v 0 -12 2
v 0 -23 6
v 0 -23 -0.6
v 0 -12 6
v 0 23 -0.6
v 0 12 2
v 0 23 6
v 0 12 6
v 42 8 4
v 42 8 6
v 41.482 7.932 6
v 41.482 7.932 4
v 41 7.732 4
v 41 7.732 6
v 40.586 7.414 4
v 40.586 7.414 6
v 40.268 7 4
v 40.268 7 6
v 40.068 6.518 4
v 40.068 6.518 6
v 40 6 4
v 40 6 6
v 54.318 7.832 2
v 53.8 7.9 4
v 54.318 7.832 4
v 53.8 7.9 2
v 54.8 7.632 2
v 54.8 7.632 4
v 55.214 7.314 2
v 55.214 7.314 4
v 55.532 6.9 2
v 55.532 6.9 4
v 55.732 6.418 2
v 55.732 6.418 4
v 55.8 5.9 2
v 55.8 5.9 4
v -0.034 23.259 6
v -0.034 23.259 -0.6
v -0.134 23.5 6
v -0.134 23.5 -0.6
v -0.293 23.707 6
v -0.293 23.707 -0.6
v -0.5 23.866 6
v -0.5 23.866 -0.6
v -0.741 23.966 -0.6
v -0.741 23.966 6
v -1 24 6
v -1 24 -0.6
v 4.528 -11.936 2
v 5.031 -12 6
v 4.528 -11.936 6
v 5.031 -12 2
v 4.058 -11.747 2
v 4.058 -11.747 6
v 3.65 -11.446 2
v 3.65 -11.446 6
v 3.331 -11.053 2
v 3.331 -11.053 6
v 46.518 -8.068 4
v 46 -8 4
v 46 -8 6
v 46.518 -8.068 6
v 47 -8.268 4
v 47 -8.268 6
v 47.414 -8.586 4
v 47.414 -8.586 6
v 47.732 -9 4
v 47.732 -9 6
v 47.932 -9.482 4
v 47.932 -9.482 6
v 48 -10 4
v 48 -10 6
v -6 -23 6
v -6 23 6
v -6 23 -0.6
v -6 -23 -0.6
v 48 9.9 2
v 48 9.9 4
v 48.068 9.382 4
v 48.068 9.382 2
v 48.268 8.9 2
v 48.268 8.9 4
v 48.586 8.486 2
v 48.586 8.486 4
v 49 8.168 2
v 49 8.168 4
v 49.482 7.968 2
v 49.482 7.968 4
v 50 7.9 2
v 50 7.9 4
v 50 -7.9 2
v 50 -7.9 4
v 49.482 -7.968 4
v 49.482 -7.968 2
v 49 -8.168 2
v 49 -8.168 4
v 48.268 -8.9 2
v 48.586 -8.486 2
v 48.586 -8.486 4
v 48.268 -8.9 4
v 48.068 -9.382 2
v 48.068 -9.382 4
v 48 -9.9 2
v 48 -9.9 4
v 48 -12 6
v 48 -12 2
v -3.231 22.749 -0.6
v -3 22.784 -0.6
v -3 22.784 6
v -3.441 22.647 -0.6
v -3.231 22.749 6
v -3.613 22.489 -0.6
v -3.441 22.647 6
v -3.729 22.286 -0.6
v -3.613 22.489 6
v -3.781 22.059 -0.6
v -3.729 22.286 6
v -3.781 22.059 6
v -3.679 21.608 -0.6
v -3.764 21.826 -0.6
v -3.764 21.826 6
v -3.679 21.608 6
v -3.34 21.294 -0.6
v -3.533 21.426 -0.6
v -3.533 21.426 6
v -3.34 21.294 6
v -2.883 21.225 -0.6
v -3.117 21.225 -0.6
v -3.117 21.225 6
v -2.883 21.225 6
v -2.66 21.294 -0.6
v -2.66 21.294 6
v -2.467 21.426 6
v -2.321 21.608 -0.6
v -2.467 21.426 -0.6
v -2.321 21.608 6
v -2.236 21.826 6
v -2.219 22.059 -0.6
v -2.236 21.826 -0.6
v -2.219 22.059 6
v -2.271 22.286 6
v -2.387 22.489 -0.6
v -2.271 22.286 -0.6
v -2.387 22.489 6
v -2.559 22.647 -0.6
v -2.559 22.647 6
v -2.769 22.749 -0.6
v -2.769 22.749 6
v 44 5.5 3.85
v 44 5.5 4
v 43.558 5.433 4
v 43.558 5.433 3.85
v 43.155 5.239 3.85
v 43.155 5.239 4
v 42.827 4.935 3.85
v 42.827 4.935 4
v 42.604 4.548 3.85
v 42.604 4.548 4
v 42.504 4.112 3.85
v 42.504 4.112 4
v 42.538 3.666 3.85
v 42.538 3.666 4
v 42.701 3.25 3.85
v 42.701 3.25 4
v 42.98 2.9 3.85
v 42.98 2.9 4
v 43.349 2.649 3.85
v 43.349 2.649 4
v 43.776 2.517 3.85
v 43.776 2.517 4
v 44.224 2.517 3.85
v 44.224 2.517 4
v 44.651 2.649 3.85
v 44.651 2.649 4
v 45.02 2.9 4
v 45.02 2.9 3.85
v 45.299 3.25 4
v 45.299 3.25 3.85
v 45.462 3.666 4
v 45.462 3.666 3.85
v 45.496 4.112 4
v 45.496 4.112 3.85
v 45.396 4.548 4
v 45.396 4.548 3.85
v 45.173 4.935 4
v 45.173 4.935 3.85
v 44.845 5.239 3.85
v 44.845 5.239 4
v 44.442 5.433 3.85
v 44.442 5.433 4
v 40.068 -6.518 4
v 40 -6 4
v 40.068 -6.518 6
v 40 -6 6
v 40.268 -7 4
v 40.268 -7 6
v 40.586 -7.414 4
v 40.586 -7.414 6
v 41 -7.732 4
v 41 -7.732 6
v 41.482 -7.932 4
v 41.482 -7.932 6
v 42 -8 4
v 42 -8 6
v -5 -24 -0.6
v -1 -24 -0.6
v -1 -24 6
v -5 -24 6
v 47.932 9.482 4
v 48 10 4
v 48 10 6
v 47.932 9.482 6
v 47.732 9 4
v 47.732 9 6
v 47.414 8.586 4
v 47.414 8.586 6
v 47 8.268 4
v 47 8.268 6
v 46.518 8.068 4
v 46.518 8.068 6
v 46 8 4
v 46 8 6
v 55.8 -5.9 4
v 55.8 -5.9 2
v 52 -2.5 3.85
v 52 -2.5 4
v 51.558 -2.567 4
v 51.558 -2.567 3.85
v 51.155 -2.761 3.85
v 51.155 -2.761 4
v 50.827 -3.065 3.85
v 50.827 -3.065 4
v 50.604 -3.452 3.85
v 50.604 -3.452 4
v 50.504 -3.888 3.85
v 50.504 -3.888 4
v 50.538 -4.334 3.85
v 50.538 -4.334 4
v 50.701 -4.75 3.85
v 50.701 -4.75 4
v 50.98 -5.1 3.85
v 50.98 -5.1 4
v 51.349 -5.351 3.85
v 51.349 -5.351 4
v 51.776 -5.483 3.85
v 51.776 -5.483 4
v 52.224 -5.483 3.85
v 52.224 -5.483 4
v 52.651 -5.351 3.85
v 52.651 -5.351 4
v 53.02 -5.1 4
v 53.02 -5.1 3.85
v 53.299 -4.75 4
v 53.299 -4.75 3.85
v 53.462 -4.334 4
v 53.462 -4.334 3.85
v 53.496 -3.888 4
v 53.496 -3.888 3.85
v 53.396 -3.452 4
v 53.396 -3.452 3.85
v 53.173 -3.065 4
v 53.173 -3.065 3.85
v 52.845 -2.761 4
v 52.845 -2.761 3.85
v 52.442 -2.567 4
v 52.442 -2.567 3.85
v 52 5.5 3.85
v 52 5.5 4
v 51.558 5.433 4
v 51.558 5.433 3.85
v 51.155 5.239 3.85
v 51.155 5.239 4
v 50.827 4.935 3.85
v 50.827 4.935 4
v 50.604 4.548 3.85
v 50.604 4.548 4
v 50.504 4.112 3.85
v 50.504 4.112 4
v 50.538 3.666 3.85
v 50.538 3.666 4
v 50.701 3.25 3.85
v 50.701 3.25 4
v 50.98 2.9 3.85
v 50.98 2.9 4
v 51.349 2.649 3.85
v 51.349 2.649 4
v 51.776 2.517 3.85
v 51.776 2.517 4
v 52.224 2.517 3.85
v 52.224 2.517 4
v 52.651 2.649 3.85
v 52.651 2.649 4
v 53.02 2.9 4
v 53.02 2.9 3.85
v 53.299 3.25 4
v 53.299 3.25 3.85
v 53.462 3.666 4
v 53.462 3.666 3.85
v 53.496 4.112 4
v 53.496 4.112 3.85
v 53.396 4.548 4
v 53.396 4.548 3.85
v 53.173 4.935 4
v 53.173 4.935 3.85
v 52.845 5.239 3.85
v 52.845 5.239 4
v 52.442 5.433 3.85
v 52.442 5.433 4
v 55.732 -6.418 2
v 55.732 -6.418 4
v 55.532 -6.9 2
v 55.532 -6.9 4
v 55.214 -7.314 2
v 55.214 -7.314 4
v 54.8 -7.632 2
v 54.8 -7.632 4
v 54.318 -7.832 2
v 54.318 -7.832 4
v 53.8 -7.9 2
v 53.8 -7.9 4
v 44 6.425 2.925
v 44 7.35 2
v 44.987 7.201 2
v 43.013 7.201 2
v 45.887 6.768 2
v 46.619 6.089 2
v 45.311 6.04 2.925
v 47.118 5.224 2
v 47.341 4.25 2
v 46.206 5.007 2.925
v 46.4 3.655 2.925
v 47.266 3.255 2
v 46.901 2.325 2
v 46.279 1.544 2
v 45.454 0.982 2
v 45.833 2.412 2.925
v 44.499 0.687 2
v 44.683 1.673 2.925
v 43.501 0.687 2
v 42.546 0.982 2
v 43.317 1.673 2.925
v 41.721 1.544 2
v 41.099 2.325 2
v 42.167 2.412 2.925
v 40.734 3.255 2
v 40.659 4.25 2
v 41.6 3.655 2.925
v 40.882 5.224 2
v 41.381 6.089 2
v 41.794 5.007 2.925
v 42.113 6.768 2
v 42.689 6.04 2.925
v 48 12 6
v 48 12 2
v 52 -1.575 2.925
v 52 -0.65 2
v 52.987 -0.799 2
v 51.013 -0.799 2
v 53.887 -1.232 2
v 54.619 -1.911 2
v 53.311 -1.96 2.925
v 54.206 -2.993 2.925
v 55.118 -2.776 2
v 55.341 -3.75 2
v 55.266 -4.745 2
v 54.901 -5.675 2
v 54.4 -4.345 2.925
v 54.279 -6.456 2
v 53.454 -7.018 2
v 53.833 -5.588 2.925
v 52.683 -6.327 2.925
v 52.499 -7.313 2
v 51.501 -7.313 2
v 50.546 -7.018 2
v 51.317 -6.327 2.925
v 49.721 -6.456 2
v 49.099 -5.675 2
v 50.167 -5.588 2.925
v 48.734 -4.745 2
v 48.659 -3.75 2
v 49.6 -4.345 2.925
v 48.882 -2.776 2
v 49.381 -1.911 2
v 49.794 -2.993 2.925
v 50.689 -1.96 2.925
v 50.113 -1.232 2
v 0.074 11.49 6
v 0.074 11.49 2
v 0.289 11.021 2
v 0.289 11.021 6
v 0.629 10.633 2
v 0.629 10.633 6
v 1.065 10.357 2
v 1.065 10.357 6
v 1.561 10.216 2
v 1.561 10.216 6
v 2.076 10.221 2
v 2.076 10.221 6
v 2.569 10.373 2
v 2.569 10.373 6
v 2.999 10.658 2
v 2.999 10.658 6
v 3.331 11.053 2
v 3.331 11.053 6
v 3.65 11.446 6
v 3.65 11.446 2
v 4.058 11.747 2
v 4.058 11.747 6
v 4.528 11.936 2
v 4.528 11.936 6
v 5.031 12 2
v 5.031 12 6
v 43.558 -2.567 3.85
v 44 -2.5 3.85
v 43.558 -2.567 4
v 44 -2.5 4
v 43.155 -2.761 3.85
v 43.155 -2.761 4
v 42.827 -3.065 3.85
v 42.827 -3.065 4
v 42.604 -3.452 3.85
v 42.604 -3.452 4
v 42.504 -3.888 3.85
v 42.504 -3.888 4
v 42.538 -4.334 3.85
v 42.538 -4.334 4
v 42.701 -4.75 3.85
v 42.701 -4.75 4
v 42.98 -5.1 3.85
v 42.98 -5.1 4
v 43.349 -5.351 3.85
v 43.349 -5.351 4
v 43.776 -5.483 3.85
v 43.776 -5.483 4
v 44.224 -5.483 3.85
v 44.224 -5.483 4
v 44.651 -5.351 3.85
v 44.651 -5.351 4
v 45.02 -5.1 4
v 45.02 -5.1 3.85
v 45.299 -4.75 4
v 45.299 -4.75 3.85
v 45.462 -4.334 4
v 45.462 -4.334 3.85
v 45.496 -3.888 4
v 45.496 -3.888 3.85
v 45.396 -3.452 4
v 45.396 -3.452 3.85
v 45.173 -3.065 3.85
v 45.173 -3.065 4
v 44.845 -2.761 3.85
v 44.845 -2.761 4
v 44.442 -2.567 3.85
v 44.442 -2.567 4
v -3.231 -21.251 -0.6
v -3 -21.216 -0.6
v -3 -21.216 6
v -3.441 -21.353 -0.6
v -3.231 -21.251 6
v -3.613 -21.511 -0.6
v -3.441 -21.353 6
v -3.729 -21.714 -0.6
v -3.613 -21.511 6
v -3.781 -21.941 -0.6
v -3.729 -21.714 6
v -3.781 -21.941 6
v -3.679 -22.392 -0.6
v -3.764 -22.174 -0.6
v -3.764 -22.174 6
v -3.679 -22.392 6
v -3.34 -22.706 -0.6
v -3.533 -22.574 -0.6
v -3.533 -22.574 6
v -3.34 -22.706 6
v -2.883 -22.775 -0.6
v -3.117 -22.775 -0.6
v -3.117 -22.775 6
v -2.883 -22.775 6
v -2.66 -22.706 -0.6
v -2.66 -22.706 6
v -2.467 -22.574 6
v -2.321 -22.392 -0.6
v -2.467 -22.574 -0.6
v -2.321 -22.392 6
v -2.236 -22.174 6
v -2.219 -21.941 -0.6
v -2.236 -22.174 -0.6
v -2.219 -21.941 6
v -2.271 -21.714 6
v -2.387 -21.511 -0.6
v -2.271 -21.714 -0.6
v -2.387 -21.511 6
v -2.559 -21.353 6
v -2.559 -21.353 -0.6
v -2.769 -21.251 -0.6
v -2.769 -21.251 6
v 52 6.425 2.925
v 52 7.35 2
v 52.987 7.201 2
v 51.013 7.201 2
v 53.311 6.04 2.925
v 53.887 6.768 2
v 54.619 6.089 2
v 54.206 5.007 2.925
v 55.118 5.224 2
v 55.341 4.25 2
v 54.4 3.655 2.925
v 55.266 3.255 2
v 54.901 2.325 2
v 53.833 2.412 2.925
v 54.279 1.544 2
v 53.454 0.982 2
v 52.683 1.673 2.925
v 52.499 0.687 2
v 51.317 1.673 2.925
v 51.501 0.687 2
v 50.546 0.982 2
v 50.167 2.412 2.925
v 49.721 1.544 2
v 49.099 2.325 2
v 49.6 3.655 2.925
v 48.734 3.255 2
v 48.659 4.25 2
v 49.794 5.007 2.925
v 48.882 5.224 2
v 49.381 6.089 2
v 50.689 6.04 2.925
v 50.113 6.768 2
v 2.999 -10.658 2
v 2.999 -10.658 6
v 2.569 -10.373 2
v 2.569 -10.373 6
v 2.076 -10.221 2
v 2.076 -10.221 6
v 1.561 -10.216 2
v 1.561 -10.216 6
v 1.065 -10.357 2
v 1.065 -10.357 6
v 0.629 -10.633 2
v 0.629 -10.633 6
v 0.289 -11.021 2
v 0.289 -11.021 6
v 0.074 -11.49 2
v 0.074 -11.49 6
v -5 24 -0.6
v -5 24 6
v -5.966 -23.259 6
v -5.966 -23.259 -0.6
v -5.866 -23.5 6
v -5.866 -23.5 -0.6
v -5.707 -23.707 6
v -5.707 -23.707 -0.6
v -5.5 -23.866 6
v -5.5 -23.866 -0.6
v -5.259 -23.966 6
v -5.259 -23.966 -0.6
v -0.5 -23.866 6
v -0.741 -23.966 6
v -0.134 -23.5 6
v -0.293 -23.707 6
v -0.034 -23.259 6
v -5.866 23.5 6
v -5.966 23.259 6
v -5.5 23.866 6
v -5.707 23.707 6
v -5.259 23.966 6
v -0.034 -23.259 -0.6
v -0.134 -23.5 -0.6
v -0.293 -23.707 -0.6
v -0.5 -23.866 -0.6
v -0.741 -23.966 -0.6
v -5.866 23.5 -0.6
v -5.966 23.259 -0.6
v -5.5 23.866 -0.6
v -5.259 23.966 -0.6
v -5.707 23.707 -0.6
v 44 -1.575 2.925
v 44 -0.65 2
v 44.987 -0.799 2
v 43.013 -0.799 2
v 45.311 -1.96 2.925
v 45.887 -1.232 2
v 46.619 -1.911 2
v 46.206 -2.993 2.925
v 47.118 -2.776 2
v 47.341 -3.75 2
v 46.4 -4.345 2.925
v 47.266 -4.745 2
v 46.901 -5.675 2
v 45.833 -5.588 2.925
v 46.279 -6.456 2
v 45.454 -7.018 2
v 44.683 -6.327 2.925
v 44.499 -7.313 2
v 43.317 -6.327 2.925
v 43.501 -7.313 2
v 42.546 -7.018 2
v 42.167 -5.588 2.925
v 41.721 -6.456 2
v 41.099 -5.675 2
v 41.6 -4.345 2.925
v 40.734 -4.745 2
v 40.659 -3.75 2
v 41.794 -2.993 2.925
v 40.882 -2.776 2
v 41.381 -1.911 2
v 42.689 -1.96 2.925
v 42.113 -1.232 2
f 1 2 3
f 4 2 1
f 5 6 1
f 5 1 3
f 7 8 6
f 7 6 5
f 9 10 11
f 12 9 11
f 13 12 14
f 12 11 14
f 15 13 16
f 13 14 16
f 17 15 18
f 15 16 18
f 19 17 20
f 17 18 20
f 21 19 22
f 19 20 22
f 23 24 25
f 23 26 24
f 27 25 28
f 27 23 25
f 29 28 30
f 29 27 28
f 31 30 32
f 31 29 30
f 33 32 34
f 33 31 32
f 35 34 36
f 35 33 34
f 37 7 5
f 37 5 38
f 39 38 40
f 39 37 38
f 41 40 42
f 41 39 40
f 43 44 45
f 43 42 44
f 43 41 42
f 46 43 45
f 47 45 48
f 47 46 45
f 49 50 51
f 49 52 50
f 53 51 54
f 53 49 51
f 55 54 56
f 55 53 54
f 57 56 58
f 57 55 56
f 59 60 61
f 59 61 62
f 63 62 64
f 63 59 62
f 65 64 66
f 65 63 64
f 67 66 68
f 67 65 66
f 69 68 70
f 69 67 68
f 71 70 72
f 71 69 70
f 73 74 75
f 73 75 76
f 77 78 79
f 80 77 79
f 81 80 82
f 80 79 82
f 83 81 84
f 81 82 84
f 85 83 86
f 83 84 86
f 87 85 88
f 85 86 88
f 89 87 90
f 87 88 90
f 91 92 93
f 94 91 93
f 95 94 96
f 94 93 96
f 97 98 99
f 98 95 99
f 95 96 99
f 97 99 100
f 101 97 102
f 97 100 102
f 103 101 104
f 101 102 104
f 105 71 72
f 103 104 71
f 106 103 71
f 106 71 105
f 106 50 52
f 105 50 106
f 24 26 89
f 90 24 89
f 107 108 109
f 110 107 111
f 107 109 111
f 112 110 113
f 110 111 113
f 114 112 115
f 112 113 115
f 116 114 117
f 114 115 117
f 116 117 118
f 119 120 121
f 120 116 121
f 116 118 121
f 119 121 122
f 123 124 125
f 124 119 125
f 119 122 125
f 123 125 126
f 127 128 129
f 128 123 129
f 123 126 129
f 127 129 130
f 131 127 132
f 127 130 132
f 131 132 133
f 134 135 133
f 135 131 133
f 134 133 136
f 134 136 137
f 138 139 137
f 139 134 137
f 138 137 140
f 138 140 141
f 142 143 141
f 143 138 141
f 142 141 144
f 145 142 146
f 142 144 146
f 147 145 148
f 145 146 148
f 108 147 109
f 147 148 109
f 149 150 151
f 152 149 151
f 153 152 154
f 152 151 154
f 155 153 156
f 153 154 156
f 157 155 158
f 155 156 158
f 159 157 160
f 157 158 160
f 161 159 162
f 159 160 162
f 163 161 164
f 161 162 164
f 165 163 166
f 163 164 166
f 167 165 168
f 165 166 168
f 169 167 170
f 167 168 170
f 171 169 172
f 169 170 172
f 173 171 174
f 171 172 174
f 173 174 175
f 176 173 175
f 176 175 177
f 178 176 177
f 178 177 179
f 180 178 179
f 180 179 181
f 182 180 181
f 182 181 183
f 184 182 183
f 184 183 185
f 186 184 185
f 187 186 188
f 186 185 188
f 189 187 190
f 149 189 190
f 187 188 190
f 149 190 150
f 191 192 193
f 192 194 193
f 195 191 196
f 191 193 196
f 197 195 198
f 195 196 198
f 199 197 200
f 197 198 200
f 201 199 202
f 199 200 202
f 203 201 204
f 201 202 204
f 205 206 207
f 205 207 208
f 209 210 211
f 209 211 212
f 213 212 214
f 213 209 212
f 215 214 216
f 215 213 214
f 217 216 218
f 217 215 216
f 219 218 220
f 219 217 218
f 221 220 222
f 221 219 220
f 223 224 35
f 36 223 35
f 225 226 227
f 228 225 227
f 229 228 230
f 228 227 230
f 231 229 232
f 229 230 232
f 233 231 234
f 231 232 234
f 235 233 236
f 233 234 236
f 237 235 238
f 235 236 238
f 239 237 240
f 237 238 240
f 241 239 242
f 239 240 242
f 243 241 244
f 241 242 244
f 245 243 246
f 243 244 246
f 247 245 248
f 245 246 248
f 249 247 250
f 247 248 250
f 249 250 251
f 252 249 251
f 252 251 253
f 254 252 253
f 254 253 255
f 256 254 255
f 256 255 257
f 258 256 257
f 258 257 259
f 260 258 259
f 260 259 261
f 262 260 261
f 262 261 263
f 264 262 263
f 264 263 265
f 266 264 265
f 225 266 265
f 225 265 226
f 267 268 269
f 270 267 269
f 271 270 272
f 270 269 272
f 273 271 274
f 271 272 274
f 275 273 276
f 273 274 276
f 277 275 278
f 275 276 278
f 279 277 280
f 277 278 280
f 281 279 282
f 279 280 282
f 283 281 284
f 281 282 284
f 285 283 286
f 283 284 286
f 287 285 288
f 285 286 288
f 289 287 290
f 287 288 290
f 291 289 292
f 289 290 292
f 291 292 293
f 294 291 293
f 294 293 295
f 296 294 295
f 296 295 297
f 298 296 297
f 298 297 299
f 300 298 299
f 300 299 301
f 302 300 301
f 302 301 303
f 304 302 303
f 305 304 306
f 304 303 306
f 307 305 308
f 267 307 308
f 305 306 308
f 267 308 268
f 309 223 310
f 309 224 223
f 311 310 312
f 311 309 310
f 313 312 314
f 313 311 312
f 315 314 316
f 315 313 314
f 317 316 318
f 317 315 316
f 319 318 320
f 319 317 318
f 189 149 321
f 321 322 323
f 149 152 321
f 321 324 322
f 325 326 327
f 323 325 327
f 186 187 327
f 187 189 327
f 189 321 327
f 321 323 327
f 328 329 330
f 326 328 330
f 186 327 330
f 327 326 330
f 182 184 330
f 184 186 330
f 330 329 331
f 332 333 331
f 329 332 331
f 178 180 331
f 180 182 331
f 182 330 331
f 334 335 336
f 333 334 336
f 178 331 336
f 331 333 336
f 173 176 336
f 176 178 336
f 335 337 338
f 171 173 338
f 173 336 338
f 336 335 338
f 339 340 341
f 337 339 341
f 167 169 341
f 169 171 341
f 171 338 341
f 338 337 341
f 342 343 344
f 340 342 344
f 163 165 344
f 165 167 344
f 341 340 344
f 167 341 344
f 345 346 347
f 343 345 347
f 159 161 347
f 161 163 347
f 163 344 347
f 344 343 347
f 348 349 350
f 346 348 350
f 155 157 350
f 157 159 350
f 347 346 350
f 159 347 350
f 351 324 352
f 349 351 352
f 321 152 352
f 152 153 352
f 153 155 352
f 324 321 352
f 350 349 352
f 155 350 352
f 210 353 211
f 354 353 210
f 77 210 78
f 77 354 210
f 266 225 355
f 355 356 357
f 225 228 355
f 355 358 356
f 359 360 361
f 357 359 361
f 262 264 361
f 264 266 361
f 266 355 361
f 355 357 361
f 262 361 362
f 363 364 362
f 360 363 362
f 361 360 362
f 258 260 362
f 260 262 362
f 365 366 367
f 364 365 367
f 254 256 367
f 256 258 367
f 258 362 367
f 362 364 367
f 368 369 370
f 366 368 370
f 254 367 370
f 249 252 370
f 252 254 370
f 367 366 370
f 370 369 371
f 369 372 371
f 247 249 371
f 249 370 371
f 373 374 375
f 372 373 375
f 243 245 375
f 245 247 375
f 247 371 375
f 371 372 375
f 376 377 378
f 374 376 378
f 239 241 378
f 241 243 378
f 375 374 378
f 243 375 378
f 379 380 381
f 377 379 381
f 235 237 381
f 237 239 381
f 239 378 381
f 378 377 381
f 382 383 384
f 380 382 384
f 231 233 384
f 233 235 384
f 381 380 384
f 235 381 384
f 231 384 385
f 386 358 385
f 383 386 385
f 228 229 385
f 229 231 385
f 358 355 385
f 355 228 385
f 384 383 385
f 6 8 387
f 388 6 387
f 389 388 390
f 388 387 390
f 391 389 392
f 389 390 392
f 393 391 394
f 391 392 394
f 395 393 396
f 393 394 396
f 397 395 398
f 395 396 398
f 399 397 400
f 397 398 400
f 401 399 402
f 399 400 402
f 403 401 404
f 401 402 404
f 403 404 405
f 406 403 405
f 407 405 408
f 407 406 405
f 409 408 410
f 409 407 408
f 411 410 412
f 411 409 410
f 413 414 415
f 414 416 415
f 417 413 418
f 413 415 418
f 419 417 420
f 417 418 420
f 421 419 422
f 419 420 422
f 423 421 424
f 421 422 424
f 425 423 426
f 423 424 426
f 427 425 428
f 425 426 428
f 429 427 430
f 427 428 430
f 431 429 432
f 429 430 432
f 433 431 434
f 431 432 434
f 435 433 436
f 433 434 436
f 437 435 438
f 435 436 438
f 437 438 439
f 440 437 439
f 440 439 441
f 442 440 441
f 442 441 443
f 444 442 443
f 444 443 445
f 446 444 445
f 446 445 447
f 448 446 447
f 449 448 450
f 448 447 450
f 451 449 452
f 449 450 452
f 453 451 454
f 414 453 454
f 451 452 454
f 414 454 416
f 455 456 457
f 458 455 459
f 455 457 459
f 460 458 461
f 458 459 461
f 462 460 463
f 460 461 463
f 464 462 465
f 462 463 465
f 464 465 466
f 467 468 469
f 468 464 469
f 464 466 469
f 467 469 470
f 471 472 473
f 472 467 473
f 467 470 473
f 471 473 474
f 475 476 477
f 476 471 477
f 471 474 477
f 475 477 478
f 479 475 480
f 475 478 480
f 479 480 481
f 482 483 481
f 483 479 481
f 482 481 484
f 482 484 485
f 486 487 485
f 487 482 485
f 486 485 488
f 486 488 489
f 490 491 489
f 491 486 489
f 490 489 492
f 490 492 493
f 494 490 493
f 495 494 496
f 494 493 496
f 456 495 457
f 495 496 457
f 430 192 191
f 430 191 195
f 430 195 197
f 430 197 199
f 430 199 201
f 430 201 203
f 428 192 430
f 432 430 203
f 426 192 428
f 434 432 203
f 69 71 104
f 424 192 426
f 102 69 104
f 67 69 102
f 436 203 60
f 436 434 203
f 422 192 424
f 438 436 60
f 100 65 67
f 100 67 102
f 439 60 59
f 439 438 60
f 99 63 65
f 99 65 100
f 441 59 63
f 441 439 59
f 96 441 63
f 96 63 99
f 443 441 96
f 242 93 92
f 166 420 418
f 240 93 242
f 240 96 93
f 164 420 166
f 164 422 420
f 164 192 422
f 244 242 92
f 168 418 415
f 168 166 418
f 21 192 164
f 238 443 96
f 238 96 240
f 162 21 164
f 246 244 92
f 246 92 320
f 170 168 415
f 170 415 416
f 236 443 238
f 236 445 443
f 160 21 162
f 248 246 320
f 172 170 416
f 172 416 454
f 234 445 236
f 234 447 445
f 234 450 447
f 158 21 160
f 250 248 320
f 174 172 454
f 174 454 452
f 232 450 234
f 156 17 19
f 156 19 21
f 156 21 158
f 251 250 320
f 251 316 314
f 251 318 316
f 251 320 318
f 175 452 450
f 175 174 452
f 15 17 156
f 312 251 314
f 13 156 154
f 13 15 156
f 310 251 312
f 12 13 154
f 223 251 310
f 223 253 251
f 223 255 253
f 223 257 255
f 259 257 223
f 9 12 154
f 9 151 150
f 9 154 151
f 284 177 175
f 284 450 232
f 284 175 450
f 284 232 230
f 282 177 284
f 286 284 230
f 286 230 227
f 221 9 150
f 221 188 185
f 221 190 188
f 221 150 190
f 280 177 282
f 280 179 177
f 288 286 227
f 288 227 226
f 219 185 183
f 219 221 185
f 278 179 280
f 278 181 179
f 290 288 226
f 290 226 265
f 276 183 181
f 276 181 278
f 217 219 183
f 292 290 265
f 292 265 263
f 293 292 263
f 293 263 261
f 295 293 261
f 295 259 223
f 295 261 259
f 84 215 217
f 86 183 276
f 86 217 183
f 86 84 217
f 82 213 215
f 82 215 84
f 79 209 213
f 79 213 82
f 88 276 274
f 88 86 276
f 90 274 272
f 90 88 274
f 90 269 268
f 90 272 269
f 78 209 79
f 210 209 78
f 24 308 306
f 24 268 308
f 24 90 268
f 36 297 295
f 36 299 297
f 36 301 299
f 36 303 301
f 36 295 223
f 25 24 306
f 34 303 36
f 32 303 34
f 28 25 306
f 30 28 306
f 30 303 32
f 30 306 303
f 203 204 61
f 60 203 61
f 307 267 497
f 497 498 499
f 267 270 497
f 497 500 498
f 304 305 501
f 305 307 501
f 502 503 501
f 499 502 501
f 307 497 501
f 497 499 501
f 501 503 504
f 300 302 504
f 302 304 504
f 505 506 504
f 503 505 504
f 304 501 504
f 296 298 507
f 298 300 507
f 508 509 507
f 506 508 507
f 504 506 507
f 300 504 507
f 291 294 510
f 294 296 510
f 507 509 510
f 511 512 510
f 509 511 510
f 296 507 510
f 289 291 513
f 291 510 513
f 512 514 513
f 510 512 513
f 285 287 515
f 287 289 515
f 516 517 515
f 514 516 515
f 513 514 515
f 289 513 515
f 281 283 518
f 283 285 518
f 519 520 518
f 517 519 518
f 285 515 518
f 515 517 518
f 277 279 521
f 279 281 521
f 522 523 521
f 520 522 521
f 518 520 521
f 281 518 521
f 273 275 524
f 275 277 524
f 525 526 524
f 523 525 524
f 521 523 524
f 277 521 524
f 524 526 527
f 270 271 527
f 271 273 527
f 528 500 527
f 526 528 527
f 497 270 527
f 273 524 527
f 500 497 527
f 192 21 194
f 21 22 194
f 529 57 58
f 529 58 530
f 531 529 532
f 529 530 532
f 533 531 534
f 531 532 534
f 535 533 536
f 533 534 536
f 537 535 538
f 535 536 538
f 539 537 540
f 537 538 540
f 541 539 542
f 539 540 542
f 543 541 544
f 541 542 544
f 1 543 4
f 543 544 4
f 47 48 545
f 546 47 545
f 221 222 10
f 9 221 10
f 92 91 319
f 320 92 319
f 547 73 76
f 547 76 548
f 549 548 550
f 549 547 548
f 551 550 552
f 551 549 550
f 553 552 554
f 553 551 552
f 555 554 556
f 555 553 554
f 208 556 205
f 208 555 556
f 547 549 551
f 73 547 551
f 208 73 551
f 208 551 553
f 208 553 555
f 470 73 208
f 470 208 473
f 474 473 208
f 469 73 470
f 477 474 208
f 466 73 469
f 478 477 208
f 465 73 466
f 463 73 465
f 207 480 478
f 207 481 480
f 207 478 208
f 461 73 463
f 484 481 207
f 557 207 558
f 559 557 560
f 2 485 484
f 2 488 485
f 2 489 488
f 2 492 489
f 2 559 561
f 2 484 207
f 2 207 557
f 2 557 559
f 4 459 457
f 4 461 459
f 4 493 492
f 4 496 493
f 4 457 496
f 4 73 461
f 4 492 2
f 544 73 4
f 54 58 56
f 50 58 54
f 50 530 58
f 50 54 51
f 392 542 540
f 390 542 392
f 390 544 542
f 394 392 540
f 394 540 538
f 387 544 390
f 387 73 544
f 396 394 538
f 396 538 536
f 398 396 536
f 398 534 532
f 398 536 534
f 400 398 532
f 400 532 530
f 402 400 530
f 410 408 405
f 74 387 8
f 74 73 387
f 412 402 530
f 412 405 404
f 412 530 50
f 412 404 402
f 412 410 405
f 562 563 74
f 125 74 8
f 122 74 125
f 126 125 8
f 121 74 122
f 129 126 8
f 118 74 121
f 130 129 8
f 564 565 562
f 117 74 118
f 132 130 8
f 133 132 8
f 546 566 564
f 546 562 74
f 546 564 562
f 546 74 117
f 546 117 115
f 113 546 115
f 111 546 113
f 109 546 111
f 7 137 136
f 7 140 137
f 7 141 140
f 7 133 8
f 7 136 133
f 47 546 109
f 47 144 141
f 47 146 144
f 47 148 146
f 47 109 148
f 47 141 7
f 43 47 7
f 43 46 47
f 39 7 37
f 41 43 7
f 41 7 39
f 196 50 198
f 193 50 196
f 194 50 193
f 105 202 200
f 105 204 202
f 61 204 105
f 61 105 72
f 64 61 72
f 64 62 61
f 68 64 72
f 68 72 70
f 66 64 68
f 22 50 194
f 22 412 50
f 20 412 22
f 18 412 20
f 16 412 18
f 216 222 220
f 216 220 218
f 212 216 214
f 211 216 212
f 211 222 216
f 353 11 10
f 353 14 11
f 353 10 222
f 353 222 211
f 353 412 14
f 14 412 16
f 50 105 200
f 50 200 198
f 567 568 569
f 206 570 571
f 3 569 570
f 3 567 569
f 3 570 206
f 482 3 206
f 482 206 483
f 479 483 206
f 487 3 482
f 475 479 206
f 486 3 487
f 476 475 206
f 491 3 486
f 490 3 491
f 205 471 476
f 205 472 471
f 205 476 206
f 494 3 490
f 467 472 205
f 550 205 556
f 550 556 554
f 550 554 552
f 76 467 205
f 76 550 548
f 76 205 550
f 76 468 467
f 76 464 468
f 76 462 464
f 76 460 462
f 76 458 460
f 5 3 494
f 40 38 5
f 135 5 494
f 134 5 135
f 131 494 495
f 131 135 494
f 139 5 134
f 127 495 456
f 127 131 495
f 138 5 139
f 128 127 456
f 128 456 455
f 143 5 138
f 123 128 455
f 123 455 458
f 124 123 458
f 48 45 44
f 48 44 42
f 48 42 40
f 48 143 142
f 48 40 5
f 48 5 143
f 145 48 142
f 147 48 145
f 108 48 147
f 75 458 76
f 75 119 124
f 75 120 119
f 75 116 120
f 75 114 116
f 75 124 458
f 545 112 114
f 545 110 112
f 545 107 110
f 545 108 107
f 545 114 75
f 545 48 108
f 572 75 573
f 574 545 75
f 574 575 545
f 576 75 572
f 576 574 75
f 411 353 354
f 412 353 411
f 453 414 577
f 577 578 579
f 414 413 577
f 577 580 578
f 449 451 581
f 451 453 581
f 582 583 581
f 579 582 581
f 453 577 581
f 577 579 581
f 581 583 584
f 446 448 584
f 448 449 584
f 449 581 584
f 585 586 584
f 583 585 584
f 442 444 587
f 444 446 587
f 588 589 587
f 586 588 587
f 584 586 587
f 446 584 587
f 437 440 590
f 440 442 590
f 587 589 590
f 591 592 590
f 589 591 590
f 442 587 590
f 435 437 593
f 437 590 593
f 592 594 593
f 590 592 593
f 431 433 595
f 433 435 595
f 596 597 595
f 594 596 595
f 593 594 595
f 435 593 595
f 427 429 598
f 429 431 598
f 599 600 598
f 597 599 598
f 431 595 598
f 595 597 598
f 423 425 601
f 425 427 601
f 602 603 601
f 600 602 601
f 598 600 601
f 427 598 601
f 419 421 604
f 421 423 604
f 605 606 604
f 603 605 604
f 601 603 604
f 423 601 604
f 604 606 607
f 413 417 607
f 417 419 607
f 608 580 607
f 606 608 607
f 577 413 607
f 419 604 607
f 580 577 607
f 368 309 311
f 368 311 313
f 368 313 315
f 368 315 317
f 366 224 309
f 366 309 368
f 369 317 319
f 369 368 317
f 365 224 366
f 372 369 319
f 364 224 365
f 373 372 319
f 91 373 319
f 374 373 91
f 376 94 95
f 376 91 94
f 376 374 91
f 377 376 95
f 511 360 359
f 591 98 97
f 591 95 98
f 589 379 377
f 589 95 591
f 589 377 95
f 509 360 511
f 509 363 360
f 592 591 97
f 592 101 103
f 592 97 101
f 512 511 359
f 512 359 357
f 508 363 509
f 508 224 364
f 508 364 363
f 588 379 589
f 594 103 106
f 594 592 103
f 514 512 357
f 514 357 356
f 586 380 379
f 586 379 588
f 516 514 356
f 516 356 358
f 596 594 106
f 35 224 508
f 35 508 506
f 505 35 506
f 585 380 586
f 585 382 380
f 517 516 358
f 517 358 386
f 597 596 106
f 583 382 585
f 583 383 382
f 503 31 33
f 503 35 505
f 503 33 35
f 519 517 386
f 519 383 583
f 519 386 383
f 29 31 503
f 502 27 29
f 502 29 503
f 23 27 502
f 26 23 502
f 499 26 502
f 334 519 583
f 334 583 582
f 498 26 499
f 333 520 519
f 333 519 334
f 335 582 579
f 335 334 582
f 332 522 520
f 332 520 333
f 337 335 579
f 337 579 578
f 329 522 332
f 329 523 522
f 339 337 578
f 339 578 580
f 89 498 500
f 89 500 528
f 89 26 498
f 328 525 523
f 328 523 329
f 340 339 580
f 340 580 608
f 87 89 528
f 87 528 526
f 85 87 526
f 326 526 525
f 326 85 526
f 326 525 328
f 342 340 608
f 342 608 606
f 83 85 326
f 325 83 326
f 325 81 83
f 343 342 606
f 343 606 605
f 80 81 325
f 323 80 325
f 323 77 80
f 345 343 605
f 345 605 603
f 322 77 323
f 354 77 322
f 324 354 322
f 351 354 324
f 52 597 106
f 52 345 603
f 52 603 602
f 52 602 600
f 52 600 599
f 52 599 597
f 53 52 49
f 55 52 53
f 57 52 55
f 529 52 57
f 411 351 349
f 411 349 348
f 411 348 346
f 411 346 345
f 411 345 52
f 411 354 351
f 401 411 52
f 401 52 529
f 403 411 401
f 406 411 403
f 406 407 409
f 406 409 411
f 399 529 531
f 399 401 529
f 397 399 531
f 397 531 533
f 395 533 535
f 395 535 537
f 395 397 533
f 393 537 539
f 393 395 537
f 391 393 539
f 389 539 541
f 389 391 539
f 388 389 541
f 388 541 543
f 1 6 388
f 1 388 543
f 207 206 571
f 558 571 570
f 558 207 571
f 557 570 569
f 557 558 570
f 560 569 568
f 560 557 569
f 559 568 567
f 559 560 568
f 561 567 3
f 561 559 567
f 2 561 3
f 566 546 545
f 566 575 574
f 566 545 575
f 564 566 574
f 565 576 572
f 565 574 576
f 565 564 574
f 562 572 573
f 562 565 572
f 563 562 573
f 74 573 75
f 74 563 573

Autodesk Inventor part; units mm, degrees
ref_plane "YZ Plane" through (0, 0, 0) normal (1, 0, 0) x (0, 1, 0)
ref_plane "XZ Plane" through (0, 0, 0) normal (0, 1, 0) x (-1, 0, 0)
ref_plane "XY Plane" through (0, 0, 0) normal (0, 0, 1) x (1, 0, 0)
sketch "Skizze1" plane through (0, 0, 0) normal (0, 0, 1) x (1, 0, 0)
  line L0 (-6, 12) -> (48, 12)
  line L1 (48, 12) -> (48, -12)
  line L2 (48, -12) -> (-6, -12)
  line L3 (-16.8, 0) -> (58.8, 0) projected
  line L4 (0, 16.8) -> (0, -16.8) projected
  line L5 (-6, 12) -> (-6, -12)
  point P0 (0, 0)
  dimension "d2" = 24
  dimension "d3" = 54
  dimension "d59" = 6
extrude "Extrusion1" add sketch "Skizze1" along normal blind 6
sketch "Skizze2" plane through (0, 0, 0) normal (0, 0, -1) x (-1, 0, 0)
  line L0 (-48, -12) -> (6, -12) projected
  line L1 (-48, 12) -> (-48, -12) projected
  line L2 (-48, 12) -> (6, 12) projected
  line L3 (6, -12) -> (-48, -12)
  line L4 (-48, -12) -> (-48, 12)
  line L5 (-48, 12) -> (6, 12)
  line L6 (6, 12) -> (6, -12)
  point P0 (0, 0)
extrude "Extrusion2" cut sketch "Skizze2" against normal blind 2
sketch "Skizze3" plane through (0, 0, 2) normal (0, 0, -1) x (-1, 0, 0)
  line L0 (6, -12) -> (-48, -12) projected
  line L1 (-48, -12) -> (-48, 12) projected
  line L2 (-48, 12) -> (6, 12) projected
  line L3 (-48, -12) -> (-44, -12)
  line L4 (-44, -12) -> (-44, 12)
  line L5 (-44, 12) -> (-48, 12)
  line L6 (-48, 12) -> (-48, -12)
  point P0 (0, 0)
  point P1 (0, -12.5)
  dimension "d9" = 4
extrude "Extrusion3" [suppressed]
sketch "Skizze4" plane through (0, 0, 6) normal (0, 0, 1) x (1, 0, 0)
  line L0 (48, -12) -> (48, 12) projected
  line L1 (-17, 0) -> (60, 0) projected
  point P0 (0, 0)
  point P1 (46, 0)
  dimension "d12" = 2
hole "Bohrung1" [suppressed]
pattern_linear "Rechteckige Anordnung1" [suppressed]
sketch "Skizze7" plane through (0, 0, 2) normal (0, 0, -1) x (-1, 0, 0)
  line L0 (6, -12) -> (-48, -12) projected
  line L1 (6, 12) -> (6, -12) projected
  line L2 (-48, 12) -> (6, 12) projected
  line L3 (-48, 12) -> (6, 12) projected
  line L4 (6, -12) -> (0, -12)
  line L5 (0, -12) -> (0, 12)
  line L6 (0, 12) -> (6, 12)
  line L7 (6, 12) -> (6, -12)
  line L8 (-48, -12) -> (-48, 12) projected
  point P0 (0, 0)
  point P1 (-44, 12)
extrude "Extrusion4" add sketch "Skizze7" along normal blind 2.8 contours L0 L5 L2 L1
sketch "Skizze8" plane through (0, 0, -0.8) normal (0, 0, -1) x (-1, 0, 0)
  line L0 (6, -12) -> (6, 12) projected
  line L1 (6, 12) -> (0, 12) projected
  line L2 (0, 12) -> (0, -12) projected
  line L3 (0, -12) -> (6, -12) projected
  line L4 (-58.8, 0) -> (16.8, 0) projected
  line L5 (6, 12) -> (0, 12)
  line L6 (0, 12) -> (0, 24)
  line L7 (0, 24) -> (6, 24)
  line L8 (6, 24) -> (6, 12)
  line L9 (6, -12) -> (-48, -12) projected
  line L10 (6, -12) -> (0, -12)
  line L11 (0, -12) -> (0, -24)
  line L12 (0, -24) -> (6, -24)
  line L13 (6, -24) -> (6, -12)
  line L14 (6, -12) -> (6, 12) projected
  dimension "d67" = 48
extrude "Extrusion5" add sketch "Skizze8" against normal up to surface (6.8 mm away)
sketch "Skizze9" plane through (0, 0, 6) normal (0, 0, 1) x (1, 0, 0)
  line L0 (0, -12) -> (48, -12) projected
  line L1 (48, -12) -> (48, 12) projected
  line L2 (48, 12) -> (0, 12) projected
  line L3 (0, 24) -> (0, 12) projected
  line L4 (-6, 24) -> (0, 24) projected
  line L5 (-6, -24) -> (-6, 24) projected
  line L6 (0, -24) -> (-6, -24) projected
  line L7 (0, -12) -> (0, -24) projected
  line L8 (48, 12) -> (0, 12) projected
  arc A0 (0, 12) -> (3.6, 12) centre (1.8, 12) ccw
  line L9 (0, -12) -> (48, -12) projected
  arc A1 (3.6, -12) -> (0, -12) centre (1.8, -12) ccw
  line L10 (-16.8, 0) -> (58.8, 0) projected
  point P0 (0, 0)
  point P1 (44, 12)
  point P2 (44, -12)
  dimension "d68" = 1.8
extrude "Extrusion6" cut sketch "Skizze9" against normal through all contours A1 L0 | A0 L2
fillet "Rundung1" radius 2 4 edges at (0, -12, 4) (3.6, -12, 4) (0, 12, 4) (3.6, 12, 4)
sketch "Skizze10" plane through (0, 0, -0.8) normal (0, 0, -1) x (-1, 0, 0)
  line L0 (0, -24) -> (0, 24) projected
  line L1 (-58.8, 0) -> (16.8, 0) projected
  line L2 (0, -22) -> (6, -22) construction
  line L3 (6, 24) -> (6, -24) projected
  point P0 (0, 0)
  point P1 (3, -22)
  point P2 (3, 22)
  dimension "d72" = 22
hole "Bohrung4" at (-3, -22, -0.8) at (-3, 22, -0.8) direction (0, 0, 1) diameter 1.567 end through all thread size "M2x0.4" class "6H" standard "ISO Metric profile"
fillet "Rundung2" radius 1 4 edges at (0, 24, 2.6) (-6, 24, 2.6) (0, -24, 2.6) (-6, -24, 2.6)
sketch "Skizze11" plane through (0, 0, -0.8) normal (0, 0, -1) x (-1, 0, 0)
  arc A0 (5, -24) -> (6, -23) centre (5, -23) ccw projected
  line L0 (6, 23) -> (6, -23) projected
  arc A1 (6, 23) -> (5, 24) centre (5, 23) ccw projected
  line L1 (1, 24) -> (5, 24) projected
  arc A2 (1, 24) -> (0, 23) centre (1, 23) ccw projected
  line L2 (0, -23) -> (0, 23) projected
  arc A3 (0, -23) -> (1, -24) centre (1, -23) ccw projected
  line L3 (5, -24) -> (1, -24) projected
  circle A4 centre (3, -22) radius 0.7835 projected
  circle A5 centre (3, 22) radius 0.7835 projected
  point P0 (0, 0)
extrude "Extrusion7" cut sketch "Skizze11" against normal blind 0.2
sketch "Skizze12" plane through (0, 0, 6) normal (0, 0, 1) x (1, 0, 0)
  line L0 (48, -12) -> (48, 12) construction
  line L1 (-16.8, 0) -> (58.8, 0) construction
  line L2 (48, -12) -> (48, 12) projected
  line L3 (48, 8) -> (42, 8)
  line L4 (40, 6) -> (40, -6)
  line L5 (42, -8) -> (48, -8)
  line L6 (48, -8) -> (48, 8)
  arc A0 (42, 8) -> (40, 6) centre (42, 6) ccw
  arc A1 (40, -6) -> (42, -8) centre (42, -6) ccw
  point P0 (0, 0)
  dimension "d83" = 2
  dimension "d84" = 4
  dimension "d85" = 8
extrude "Extrusion8" cut sketch "Skizze12" against normal blind 2
sketch "Skizze13" plane through (0, 0, 2) normal (0, 0, -1) x (-1, 0, 0)
  line L0 (-48, -12) -> (-48, 12) construction
  line L1 (-58.8, 0) -> (16.8, 0) construction
  line L2 (-48, -7.9) -> (-53.8, -7.9)
  line L3 (-55.8, -5.9) -> (-55.8, 5.9)
  line L4 (-53.8, 7.9) -> (-48, 7.9)
  line L5 (-48, 7.9) -> (-48, -7.9)
  arc A0 (-55.8, -5.9) -> (-53.8, -7.9) centre (-53.8, -5.9) ccw
  arc A1 (-53.8, 7.9) -> (-55.8, 5.9) centre (-53.8, 5.9) ccw
  point P0 (0, 0)
  dimension "d88" = 2
  dimension "d89" = 4.1
  dimension "d90" = 7.8
extrude "Extrusion9" add sketch "Skizze13" against normal blind 2
sketch "Skizze14" plane through (0, 0, 2) normal (0, 0, -1) x (-1, 0, 0)
  line L0 (-48, -12) -> (-48, -7.9) construction
  line L1 (-68.16, 0) -> (18.36, 0) construction
  line L2 (-44, -4) -> (-52, -4) construction
  line L3 (-52, -4) -> (-52, 4) construction
  line L4 (-52, 4) -> (-44, 4) construction
  line L5 (-44, 4) -> (-44, -4) construction
  point P0 (0, 0)
  dimension "d93" = 8
  dimension "d94" = 8
hole "Bohrung5" at (44, -4, 2) at (52, -4, 2) at (52, 4, 2) at (44, 4, 2) direction (0, 0, 1) diameter 3 end through all countersink diameter 6.7 countersink angle 90
fillet "Rundung3" radius 2 4 edges at (48, -8, 5) (48, -7.9, 3) (48, 8, 5) (48, 7.9, 3)
properties part number "Kicker Chip" material "Aluminium 6061"
